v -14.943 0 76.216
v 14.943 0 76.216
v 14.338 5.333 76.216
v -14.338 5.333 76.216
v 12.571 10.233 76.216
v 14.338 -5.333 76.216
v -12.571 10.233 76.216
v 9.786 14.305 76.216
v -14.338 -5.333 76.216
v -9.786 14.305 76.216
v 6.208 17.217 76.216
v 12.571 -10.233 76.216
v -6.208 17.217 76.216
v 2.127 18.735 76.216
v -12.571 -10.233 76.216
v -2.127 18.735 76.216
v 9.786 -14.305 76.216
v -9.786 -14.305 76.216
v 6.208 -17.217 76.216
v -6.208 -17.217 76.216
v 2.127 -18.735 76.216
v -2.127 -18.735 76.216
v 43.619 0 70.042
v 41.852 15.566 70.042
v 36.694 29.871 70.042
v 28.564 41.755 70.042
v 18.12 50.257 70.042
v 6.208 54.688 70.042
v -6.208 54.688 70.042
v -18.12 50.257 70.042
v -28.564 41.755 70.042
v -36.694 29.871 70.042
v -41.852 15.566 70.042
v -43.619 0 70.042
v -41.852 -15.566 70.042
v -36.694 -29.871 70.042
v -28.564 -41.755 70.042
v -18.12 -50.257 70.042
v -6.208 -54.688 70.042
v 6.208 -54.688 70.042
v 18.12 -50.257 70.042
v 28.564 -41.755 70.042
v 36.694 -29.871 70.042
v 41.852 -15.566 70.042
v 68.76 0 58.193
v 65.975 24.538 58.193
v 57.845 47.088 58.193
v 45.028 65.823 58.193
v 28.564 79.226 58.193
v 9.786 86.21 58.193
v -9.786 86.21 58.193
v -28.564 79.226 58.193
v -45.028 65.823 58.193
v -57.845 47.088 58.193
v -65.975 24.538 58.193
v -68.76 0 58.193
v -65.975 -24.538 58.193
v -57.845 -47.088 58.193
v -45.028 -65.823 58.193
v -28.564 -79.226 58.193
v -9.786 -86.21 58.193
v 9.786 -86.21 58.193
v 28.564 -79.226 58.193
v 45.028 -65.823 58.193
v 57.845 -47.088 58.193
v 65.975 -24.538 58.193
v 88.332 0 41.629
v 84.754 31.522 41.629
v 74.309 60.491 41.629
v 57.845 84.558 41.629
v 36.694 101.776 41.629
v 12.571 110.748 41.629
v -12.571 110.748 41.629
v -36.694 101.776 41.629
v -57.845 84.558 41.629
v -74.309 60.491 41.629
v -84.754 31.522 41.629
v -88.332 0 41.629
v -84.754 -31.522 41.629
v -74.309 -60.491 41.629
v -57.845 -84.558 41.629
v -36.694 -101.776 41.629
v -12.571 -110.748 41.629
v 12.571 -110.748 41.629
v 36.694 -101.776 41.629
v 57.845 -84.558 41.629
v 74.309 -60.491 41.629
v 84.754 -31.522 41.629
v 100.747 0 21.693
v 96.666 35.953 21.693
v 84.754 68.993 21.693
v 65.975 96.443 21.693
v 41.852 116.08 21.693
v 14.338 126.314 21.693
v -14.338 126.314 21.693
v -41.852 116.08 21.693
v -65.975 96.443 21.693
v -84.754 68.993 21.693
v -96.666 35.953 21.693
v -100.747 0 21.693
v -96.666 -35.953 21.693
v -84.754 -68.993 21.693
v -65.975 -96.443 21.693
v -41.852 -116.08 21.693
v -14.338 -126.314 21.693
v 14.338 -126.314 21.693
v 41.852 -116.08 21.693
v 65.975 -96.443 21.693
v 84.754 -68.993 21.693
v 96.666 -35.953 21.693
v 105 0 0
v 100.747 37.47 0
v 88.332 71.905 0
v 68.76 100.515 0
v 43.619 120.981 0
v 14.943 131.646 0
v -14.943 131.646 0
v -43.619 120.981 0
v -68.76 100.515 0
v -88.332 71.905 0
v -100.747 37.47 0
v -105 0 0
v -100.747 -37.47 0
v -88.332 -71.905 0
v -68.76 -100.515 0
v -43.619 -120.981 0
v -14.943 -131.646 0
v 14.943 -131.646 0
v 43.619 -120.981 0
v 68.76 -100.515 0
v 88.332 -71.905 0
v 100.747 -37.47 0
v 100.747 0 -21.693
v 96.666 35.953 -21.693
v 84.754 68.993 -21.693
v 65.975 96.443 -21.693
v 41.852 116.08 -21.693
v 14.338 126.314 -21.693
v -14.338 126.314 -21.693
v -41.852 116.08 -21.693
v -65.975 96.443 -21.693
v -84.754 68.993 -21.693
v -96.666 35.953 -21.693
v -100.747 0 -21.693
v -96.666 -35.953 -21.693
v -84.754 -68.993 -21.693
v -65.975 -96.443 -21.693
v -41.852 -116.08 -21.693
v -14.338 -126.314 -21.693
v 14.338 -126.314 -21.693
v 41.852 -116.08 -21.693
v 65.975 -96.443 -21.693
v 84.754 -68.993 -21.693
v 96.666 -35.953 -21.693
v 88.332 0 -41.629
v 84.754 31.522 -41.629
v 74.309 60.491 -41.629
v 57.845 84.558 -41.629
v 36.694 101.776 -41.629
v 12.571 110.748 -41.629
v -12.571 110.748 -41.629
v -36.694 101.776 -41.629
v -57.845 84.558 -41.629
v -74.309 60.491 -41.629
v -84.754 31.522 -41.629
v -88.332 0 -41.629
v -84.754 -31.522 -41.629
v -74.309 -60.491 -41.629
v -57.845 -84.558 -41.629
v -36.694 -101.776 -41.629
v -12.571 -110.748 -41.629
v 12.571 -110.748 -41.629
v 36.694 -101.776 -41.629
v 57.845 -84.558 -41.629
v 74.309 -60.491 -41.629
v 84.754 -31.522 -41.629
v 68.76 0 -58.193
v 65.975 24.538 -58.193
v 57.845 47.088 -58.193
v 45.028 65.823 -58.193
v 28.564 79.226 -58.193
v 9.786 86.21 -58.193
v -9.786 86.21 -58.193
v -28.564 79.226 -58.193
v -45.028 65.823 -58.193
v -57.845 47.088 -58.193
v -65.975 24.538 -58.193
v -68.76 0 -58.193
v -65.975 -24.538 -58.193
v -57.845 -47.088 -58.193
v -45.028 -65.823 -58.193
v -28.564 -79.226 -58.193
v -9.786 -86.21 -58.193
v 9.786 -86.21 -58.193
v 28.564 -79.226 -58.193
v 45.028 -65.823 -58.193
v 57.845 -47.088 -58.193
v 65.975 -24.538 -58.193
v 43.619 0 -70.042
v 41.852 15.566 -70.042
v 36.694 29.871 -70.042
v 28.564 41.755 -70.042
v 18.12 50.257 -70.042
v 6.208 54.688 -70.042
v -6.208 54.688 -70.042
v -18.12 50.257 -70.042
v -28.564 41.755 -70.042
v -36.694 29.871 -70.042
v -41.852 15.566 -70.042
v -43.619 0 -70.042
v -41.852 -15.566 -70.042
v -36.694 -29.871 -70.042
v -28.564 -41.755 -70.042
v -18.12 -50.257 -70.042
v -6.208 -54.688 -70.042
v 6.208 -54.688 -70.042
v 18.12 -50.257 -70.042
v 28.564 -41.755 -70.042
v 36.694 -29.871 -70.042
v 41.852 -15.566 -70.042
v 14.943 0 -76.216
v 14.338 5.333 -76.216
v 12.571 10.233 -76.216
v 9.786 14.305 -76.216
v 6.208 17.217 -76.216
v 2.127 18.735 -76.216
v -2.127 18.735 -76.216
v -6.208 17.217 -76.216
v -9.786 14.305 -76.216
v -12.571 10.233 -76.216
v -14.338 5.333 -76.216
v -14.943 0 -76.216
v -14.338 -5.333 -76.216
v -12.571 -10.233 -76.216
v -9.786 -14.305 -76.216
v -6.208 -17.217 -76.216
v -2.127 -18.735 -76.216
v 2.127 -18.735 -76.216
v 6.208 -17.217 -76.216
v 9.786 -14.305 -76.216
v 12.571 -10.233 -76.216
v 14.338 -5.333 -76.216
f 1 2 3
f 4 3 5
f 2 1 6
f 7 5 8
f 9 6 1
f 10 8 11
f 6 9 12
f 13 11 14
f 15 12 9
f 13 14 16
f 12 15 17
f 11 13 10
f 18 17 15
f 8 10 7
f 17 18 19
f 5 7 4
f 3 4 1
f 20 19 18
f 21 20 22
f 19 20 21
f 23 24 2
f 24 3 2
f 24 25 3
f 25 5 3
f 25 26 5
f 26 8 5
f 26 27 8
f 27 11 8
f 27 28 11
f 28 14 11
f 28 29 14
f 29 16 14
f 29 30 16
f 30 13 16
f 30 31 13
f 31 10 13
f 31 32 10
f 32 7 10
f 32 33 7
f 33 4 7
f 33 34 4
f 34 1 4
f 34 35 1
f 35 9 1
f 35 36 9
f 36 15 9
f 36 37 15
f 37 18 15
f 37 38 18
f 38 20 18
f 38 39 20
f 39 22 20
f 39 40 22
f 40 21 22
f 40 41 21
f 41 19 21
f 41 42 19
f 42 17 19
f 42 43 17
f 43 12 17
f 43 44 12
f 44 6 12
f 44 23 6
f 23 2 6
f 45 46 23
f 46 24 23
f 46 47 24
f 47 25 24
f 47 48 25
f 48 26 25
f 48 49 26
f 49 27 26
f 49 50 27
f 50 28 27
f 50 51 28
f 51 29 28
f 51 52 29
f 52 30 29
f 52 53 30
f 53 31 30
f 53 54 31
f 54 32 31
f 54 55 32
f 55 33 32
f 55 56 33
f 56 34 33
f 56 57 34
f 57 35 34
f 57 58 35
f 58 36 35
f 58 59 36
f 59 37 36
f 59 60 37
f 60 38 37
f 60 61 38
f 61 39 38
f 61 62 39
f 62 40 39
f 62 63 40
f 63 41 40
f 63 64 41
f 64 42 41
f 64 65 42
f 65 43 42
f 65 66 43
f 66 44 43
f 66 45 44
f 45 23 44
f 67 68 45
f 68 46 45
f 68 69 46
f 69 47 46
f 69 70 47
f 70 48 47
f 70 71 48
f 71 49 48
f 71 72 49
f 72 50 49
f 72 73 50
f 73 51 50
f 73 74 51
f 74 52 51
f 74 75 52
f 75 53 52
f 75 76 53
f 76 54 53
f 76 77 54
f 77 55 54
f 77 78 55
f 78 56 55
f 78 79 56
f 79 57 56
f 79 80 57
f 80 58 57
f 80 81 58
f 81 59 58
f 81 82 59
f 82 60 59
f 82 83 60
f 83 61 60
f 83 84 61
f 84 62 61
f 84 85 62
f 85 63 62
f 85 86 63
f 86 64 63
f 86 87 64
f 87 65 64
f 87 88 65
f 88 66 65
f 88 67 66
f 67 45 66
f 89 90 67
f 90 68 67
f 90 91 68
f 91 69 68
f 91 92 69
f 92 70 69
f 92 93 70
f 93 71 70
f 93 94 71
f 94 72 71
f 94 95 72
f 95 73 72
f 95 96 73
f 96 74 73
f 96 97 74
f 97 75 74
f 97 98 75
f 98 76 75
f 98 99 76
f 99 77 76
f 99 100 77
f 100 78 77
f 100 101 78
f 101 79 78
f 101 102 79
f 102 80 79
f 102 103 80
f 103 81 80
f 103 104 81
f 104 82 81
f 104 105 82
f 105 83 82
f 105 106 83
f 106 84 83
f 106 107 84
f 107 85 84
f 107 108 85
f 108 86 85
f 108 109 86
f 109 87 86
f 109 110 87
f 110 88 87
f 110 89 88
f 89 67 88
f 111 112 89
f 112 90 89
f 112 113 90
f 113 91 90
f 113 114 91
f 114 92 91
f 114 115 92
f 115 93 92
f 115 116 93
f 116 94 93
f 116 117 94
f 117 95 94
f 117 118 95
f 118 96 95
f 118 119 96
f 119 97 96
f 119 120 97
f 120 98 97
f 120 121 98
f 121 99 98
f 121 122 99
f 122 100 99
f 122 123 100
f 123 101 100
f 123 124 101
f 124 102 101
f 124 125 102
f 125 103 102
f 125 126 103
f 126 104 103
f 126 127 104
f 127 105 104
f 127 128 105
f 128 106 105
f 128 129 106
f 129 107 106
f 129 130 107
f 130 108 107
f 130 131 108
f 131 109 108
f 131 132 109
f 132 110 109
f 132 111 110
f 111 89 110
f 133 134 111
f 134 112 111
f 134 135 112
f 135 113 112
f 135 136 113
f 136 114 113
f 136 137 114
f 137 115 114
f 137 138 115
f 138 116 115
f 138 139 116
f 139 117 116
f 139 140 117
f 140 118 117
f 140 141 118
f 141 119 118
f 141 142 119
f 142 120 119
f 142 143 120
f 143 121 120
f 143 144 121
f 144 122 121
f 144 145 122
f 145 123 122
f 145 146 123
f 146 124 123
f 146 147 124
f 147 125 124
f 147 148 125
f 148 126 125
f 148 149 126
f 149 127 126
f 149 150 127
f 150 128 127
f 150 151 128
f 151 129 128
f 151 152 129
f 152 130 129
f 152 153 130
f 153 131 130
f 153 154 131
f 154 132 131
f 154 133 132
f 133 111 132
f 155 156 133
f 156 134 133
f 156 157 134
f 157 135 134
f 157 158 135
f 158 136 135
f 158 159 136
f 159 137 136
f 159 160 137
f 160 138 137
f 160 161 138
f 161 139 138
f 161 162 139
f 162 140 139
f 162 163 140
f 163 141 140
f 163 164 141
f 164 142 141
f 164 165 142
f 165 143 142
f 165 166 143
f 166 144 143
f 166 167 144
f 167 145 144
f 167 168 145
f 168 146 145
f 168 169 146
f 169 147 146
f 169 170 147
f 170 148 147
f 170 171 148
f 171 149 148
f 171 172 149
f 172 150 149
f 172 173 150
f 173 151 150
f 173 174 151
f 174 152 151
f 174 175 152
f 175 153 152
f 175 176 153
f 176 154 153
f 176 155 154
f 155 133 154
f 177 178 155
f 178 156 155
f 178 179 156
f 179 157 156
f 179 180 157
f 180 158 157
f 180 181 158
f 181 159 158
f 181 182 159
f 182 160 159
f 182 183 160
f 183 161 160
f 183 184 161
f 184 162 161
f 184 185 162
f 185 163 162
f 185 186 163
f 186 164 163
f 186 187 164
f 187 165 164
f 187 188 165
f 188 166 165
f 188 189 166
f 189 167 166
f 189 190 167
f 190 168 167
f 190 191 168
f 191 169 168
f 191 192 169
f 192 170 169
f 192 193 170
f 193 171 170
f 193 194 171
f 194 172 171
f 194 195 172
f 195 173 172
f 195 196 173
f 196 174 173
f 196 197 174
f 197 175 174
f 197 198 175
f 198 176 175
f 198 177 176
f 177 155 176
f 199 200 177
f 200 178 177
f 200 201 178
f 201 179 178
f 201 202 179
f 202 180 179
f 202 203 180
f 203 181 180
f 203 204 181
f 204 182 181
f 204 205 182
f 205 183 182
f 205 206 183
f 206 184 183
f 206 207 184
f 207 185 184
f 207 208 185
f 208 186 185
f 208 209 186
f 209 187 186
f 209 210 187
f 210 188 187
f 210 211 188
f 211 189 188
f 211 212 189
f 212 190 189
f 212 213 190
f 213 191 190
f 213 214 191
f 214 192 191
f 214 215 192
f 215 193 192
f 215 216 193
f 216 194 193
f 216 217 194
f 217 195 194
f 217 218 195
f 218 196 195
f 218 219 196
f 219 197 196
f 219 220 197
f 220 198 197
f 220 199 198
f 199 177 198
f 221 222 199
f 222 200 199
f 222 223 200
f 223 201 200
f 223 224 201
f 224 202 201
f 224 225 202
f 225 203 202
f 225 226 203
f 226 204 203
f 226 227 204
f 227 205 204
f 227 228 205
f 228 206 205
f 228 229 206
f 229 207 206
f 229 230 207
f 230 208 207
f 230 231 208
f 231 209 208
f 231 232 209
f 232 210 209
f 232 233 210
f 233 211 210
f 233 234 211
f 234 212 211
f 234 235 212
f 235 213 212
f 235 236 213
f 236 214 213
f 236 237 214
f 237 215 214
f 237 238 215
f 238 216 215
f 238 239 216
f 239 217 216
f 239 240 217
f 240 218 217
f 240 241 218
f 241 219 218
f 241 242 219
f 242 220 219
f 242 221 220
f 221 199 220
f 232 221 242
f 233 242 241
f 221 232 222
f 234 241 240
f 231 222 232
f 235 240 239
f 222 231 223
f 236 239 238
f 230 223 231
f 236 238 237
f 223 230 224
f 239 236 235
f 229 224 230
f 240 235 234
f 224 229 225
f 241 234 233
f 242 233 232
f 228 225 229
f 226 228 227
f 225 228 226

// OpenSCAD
// Generated by SolidPython 1.0.1 on 2020-07-29 00:46:52


scale(v = [15, 19, 11]) {
	sphere(r = 7);
}
/***********************************************
*********      SolidPython code:      **********
************************************************
 
# import packages: SolidPython
from solid import *
from solid.utils import *
from itertools import chain, combinations, permutations


class Resize:

    def __init__(self, scad_file):
        self.scad_file = scad_file
        #self.scad_file = import_scad(scad_file)
        # cone/cylinder param:
        self.r1 = 0
        self.r2 = 0
        self.h = 0
        # rectangular prism param:
        self.w = 0
        self.l = 0
        # ellipse param:
        self.r = 0

    # import OpenScad code (file name corresponds to shape)


    # classify shape + parameters
    def assign(self, param1, param2, param3):
        if self.scad_file == 'cone.scad':
            self.r1 = param1
            self.r2 = param2
            self.h = param3
        elif self.scad_file == 'cylinder.scad':
            self.r1 = param1
            self.r2 = param2
            self.h = param3
        elif self.scad_file == 'rectangularPrism.scad':
            self.h = param1
            self.l = param2
            self.w = param3
        else:
            self.r = param1
            self.h = param2

    # resize parameters
    def iterate(self):
        x = range(3, 20, 2)
        i = 1
        if self.scad_file == 'cone.scad':
            tempList = list(permutations(x, 2))
            for temp in tempList:
                param1 = temp[0]
                param2 = temp[1]
                filepath = 'produced_scad_files/' + 'cone' + str(param1) + '_' + str(param2) + '_' + '.scad'
                scad_render_to_file(cylinder(h=param1, r1=param2, r2=0), filepath)

        elif self.scad_file == 'cylinder.scad':
            tempList = list(permutations(x, 3))
            for temp in tempList:
                param1 = temp[0]
                param2 = temp[1]
                filepath = 'produced_scad_files/' + 'cylinder' + str(param1) + '_' + str(param2) + '_' + '.scad'
                scad_render_to_file(cylinder(h=param1, r1=param2, r2=param2), filepath)

        elif self.scad_file == 'rectangularPrism.scad':
            tempList = list(permutations(x, 3))
            for temp in tempList:
                param1 = temp[0]
                param2 = temp[1]
                param3 = temp[2]
                filepath = 'produced_scad_files/' + 'rectangularPrism' + str(param1) + '_' + str(param2) + '_' + str(
                    param3) + '.scad'
                scad_render_to_file(cube(size=(param1, param2, param3)), filepath)

        elif self.scad_file == 'ellipse.scad':
            tempList = list(permutations(x, 4))
            for temp in tempList:
                param1 = temp[0]
                param2 = temp[1]
                param3 = temp[2]
                param4 = temp[3]
                filepath = 'produced_scad_files/' + 'ellipse' + str(param1) + '_' + str(param2) + '_' + str(param3) + '_' + str(param4) + '.scad'
                scad_render_to_file(scale([param1, param2, param3])(sphere(r=param4)), filepath)

    def render_to_scadfile(self):
        scad_render_to_file(scad, 'example.scad') 
 
************************************************/
